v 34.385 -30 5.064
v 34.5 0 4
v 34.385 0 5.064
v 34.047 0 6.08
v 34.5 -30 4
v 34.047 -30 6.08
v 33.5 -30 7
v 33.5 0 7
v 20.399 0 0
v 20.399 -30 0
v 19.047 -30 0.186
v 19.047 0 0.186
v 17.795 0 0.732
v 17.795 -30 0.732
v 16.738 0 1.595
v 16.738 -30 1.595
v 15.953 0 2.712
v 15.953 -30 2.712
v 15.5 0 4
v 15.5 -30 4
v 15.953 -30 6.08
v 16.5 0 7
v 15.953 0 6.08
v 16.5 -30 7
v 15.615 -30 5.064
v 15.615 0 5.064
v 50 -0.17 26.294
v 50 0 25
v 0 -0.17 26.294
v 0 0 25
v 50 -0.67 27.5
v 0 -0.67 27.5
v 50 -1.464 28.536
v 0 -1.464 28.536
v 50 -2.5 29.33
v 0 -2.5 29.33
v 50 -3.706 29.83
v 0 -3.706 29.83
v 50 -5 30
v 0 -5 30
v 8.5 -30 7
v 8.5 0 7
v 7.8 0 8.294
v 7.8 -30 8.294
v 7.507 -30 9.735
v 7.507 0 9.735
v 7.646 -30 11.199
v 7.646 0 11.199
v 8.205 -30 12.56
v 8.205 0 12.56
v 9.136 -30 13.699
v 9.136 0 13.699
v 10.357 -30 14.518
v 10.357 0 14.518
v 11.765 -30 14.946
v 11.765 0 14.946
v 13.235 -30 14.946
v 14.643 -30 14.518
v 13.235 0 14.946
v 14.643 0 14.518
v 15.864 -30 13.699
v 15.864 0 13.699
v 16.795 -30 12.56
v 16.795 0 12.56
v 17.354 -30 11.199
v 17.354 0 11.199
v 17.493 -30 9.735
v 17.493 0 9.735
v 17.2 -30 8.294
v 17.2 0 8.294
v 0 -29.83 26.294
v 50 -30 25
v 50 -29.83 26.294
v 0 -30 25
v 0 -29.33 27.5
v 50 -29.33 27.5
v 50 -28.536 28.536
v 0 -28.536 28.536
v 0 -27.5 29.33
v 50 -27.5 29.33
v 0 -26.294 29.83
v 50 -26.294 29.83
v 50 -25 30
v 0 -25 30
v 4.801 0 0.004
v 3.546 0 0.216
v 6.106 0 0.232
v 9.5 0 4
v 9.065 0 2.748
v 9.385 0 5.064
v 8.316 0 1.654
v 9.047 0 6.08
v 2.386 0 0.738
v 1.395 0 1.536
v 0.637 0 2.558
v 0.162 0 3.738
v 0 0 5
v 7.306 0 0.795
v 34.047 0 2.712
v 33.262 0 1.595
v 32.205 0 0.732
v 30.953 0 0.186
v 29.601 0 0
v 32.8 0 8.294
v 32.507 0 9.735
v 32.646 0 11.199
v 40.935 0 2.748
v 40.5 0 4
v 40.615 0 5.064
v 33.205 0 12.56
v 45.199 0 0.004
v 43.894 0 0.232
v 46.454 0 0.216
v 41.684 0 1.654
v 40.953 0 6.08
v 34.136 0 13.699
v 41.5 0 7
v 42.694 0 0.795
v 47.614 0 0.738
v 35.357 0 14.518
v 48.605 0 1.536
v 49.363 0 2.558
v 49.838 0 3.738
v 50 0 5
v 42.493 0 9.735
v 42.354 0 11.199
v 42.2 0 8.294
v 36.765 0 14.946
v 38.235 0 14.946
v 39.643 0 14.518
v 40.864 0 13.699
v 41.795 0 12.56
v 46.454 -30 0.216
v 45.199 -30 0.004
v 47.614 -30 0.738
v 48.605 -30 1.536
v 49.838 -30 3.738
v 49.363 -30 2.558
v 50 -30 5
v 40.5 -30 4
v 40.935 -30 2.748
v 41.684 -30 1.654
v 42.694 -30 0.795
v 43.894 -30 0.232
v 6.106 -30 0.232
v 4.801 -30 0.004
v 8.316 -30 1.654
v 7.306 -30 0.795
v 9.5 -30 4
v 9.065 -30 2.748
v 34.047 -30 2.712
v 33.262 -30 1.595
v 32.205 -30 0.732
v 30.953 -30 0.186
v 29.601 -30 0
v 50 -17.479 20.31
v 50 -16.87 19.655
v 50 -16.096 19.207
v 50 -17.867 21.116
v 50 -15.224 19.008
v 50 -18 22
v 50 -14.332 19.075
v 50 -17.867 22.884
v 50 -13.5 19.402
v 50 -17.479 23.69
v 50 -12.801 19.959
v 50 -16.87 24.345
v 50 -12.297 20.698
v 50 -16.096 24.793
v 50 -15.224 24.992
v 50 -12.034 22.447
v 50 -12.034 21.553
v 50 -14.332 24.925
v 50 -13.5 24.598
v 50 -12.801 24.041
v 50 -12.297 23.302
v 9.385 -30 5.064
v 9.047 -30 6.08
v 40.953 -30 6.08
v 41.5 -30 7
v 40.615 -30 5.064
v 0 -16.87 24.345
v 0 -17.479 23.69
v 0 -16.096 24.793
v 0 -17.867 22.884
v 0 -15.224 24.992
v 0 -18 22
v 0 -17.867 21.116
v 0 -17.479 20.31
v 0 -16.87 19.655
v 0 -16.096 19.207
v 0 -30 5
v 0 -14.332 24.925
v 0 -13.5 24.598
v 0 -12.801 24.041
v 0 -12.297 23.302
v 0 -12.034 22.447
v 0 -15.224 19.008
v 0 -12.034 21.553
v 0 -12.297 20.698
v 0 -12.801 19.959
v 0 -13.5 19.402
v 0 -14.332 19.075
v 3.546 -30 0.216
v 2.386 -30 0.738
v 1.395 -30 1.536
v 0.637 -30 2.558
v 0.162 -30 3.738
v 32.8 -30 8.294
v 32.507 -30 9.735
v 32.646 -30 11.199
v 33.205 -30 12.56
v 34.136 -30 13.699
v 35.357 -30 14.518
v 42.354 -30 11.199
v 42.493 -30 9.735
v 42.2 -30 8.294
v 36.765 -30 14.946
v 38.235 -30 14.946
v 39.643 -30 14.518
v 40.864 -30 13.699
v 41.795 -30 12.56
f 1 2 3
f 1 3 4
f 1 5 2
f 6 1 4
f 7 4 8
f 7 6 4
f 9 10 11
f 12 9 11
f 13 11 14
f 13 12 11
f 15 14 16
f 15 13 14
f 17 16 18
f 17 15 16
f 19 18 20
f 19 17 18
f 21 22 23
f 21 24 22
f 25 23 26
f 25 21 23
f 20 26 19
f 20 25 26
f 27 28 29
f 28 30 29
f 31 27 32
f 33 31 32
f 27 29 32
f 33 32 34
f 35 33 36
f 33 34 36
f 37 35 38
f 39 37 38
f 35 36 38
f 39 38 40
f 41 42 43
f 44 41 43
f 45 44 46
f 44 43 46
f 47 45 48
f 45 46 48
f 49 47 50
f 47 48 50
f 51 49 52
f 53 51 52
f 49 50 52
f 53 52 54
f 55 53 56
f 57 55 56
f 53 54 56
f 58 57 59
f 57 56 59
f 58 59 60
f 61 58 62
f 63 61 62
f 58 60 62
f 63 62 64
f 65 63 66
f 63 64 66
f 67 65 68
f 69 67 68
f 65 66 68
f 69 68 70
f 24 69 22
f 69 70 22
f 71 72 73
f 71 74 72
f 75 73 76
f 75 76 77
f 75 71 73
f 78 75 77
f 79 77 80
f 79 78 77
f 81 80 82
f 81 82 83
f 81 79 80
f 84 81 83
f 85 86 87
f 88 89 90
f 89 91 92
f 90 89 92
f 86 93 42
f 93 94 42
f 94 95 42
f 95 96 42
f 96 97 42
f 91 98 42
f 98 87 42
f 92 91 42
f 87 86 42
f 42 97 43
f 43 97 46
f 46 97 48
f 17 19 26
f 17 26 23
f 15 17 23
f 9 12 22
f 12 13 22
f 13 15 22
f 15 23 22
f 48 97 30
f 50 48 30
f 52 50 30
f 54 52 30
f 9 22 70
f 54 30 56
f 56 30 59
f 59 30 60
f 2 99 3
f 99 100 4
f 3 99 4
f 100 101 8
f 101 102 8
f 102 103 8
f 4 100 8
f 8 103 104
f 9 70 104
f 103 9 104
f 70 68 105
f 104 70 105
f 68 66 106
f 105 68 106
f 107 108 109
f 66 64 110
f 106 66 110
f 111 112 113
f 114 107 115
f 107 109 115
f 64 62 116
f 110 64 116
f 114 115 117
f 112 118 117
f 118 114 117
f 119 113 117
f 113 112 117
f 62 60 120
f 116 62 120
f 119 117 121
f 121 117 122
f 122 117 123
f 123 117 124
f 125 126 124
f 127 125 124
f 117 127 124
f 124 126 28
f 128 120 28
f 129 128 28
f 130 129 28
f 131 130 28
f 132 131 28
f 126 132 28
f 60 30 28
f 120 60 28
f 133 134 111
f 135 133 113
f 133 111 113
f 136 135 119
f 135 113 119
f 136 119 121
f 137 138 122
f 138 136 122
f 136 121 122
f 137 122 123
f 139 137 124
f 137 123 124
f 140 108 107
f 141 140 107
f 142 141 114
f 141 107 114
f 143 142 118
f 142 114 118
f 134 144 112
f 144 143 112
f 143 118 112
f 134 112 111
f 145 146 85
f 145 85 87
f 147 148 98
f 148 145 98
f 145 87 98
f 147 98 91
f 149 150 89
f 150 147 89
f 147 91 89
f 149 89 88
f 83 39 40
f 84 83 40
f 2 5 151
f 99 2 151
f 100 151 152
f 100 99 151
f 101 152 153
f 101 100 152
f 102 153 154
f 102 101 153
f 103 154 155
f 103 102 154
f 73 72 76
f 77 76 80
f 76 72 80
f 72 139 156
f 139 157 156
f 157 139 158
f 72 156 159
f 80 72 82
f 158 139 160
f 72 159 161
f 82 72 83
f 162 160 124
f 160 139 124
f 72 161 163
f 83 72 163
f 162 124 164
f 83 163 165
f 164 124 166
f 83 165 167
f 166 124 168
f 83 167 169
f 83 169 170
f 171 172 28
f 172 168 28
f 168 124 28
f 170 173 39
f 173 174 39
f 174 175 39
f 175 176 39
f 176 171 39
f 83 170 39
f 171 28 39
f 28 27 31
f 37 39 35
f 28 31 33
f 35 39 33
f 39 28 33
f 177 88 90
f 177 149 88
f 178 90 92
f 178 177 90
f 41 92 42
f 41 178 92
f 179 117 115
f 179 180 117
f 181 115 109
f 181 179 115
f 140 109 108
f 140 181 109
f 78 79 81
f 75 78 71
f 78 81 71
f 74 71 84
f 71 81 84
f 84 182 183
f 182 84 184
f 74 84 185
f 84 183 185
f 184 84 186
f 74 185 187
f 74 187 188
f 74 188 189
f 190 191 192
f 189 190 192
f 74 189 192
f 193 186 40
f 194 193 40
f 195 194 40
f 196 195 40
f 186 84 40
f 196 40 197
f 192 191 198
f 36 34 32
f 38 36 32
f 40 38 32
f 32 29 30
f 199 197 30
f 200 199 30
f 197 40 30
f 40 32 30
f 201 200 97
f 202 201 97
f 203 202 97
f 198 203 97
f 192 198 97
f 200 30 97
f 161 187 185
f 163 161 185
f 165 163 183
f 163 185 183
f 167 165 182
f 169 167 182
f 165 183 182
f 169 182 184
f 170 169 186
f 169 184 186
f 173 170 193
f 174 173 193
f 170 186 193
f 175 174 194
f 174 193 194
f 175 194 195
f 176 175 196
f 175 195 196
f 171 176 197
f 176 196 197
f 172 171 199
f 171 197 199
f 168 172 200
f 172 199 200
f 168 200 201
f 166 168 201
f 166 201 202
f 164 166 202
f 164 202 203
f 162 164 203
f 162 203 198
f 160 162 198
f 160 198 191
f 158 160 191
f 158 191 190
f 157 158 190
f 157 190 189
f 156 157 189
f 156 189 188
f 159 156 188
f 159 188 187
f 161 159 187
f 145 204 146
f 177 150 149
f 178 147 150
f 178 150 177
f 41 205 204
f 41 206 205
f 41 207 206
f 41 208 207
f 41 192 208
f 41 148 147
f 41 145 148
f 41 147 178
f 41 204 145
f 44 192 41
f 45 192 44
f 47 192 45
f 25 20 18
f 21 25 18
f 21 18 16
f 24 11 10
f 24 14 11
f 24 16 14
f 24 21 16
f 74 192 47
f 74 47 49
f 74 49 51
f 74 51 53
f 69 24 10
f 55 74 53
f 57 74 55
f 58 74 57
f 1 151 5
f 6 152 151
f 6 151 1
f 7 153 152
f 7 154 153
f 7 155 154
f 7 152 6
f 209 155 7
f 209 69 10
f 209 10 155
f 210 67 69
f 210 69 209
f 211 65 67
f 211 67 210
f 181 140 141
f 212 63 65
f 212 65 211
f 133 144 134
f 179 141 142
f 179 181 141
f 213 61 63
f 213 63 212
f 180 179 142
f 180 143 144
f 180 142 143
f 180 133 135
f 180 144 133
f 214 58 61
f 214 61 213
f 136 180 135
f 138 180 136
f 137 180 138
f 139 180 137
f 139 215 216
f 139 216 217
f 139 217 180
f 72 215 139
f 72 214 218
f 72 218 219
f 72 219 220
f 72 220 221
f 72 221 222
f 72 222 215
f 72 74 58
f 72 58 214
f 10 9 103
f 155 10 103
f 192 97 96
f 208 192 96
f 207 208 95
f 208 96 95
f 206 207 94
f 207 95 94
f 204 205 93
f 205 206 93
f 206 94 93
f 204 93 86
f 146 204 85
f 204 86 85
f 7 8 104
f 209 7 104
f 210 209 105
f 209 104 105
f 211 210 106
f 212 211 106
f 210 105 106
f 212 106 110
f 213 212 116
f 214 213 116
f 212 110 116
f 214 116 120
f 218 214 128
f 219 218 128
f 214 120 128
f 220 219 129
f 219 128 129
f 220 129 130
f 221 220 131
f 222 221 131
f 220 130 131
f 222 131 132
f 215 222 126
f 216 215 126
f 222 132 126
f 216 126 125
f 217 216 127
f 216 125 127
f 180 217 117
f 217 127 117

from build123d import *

# Parameters (mm, degrees)
F1_DEPTH    = 30
F2_R        = 5
F3_T1_DEPTH = 54.4948974279
F3_T3_DEPTH = 55
F4_R        = 5
F6_D        = 6


# Not quite as in the source:
# - a fillet or chamfer that OpenCascade refuses, or shapes differently, is made with other operations: its cross-section is extruded or revolved along the edge and cut away or added


with BuildPart() as f1:
    # F0 (on Front) → F1 (new body)
    with BuildSketch(Plane.XZ):
        with BuildLine():
            Line((0, 30), (0, 0))
            Line((0, 0), (9.5, 0))
            Line((9.5, 0), (9.5, 6))
            ThreePointArc((9.5, 6), (10.2639320225, 14.472135955), (17.5, 10))
            ThreePointArc((17.5, 10), (16.972135955, 7.7639320225), (15.5, 6))
            Line((15.5, 6), (15.5, 0))
            Line((15.5, 0), (34.5, 0))
            Line((34.5, 0), (34.5, 6))
            ThreePointArc((34.5, 6), (35.2639320225, 14.472135955), (42.5, 10))
            ThreePointArc((42.5, 10), (41.972135955, 7.7639320225), (40.5, 6))
            Line((40.5, 6), (40.5, 0))
            Line((40.5, 0), (50, 0))
            Line((50, 0), (50, 30))
            Line((50, 30), (0, 30))
        make_face()
    extrude(amount=F1_DEPTH)

    # F2
    f2_edges = [f1.edges().sort_by_distance(p)[0] for p in [
        (40.5, -15, 6),
        (34.5, -15, 6),
        (9.5, -15, 6),
        (15.5, -15, 6),
    ]]
    fillet(f2_edges, radius=F2_R)

    # F3: fillet of radius 5 on 6 edges, made by hand

    # F3_s2 → F3_t1 (cut)
    with BuildSketch(Plane.XZ.offset(-12.2474487139)):
        with BuildLine():
            ThreePointArc((4.6010205144, 0), (7.7632981746, 1.1270166538), (9.5, 4))
            Line((9.5, 4), (9.5, 0))
            Line((9.5, 0), (4.6010205144, 0))
        make_face()
        with BuildLine():
            ThreePointArc((34.5, 4), (32.7632981746, 1.1270166538), (29.6010205144, 0))
            Line((29.6010205144, 0), (34.5, 0))
            Line((34.5, 0), (34.5, 4))
        make_face()
        with BuildLine():
            ThreePointArc((40.5, 4), (42.2367018254, 1.1270166538), (45.3989794856, 0))
            Line((45.3989794856, 0), (40.5, 0))
            Line((40.5, 0), (40.5, 4))
        make_face()
        with BuildLine():
            ThreePointArc((20.3989794856, 0), (17.2367018254, 1.1270166538), (15.5, 4))
            Line((15.5, 4), (15.5, 0))
            Line((15.5, 0), (20.3989794856, 0))
        make_face()
    extrude(amount=F3_T1_DEPTH, mode=Mode.SUBTRACT)

    # F3_s4 → F3_t3 (cut)
    with BuildSketch(Plane.XZ.offset(-12.5)):
        with BuildLine():
            ThreePointArc((45, 0), (48.5355339059, 1.4644660941), (50, 5))
            Line((50, 5), (50, 0))
            Line((50, 0), (45, 0))
        make_face()
        with BuildLine():
            ThreePointArc((0, 5), (1.4644660941, 1.4644660941), (5, 0))
            Line((5, 0), (0, 0))
            Line((0, 0), (0, 5))
        make_face()
    extrude(amount=F3_T3_DEPTH, mode=Mode.SUBTRACT)

    # F4
    f4_edges = [f1.edges().sort_by_distance(p)[0] for p in [
        (25, -30, 30),
        (25, 0, 30),
    ]]
    fillet(f4_edges, radius=F4_R)

    # F6 (through all)
    with Locations(Plane.YZ.offset(50)):
        with Locations((-15, 22)):
            Hole(F6_D / 2)


solid = f1.part
